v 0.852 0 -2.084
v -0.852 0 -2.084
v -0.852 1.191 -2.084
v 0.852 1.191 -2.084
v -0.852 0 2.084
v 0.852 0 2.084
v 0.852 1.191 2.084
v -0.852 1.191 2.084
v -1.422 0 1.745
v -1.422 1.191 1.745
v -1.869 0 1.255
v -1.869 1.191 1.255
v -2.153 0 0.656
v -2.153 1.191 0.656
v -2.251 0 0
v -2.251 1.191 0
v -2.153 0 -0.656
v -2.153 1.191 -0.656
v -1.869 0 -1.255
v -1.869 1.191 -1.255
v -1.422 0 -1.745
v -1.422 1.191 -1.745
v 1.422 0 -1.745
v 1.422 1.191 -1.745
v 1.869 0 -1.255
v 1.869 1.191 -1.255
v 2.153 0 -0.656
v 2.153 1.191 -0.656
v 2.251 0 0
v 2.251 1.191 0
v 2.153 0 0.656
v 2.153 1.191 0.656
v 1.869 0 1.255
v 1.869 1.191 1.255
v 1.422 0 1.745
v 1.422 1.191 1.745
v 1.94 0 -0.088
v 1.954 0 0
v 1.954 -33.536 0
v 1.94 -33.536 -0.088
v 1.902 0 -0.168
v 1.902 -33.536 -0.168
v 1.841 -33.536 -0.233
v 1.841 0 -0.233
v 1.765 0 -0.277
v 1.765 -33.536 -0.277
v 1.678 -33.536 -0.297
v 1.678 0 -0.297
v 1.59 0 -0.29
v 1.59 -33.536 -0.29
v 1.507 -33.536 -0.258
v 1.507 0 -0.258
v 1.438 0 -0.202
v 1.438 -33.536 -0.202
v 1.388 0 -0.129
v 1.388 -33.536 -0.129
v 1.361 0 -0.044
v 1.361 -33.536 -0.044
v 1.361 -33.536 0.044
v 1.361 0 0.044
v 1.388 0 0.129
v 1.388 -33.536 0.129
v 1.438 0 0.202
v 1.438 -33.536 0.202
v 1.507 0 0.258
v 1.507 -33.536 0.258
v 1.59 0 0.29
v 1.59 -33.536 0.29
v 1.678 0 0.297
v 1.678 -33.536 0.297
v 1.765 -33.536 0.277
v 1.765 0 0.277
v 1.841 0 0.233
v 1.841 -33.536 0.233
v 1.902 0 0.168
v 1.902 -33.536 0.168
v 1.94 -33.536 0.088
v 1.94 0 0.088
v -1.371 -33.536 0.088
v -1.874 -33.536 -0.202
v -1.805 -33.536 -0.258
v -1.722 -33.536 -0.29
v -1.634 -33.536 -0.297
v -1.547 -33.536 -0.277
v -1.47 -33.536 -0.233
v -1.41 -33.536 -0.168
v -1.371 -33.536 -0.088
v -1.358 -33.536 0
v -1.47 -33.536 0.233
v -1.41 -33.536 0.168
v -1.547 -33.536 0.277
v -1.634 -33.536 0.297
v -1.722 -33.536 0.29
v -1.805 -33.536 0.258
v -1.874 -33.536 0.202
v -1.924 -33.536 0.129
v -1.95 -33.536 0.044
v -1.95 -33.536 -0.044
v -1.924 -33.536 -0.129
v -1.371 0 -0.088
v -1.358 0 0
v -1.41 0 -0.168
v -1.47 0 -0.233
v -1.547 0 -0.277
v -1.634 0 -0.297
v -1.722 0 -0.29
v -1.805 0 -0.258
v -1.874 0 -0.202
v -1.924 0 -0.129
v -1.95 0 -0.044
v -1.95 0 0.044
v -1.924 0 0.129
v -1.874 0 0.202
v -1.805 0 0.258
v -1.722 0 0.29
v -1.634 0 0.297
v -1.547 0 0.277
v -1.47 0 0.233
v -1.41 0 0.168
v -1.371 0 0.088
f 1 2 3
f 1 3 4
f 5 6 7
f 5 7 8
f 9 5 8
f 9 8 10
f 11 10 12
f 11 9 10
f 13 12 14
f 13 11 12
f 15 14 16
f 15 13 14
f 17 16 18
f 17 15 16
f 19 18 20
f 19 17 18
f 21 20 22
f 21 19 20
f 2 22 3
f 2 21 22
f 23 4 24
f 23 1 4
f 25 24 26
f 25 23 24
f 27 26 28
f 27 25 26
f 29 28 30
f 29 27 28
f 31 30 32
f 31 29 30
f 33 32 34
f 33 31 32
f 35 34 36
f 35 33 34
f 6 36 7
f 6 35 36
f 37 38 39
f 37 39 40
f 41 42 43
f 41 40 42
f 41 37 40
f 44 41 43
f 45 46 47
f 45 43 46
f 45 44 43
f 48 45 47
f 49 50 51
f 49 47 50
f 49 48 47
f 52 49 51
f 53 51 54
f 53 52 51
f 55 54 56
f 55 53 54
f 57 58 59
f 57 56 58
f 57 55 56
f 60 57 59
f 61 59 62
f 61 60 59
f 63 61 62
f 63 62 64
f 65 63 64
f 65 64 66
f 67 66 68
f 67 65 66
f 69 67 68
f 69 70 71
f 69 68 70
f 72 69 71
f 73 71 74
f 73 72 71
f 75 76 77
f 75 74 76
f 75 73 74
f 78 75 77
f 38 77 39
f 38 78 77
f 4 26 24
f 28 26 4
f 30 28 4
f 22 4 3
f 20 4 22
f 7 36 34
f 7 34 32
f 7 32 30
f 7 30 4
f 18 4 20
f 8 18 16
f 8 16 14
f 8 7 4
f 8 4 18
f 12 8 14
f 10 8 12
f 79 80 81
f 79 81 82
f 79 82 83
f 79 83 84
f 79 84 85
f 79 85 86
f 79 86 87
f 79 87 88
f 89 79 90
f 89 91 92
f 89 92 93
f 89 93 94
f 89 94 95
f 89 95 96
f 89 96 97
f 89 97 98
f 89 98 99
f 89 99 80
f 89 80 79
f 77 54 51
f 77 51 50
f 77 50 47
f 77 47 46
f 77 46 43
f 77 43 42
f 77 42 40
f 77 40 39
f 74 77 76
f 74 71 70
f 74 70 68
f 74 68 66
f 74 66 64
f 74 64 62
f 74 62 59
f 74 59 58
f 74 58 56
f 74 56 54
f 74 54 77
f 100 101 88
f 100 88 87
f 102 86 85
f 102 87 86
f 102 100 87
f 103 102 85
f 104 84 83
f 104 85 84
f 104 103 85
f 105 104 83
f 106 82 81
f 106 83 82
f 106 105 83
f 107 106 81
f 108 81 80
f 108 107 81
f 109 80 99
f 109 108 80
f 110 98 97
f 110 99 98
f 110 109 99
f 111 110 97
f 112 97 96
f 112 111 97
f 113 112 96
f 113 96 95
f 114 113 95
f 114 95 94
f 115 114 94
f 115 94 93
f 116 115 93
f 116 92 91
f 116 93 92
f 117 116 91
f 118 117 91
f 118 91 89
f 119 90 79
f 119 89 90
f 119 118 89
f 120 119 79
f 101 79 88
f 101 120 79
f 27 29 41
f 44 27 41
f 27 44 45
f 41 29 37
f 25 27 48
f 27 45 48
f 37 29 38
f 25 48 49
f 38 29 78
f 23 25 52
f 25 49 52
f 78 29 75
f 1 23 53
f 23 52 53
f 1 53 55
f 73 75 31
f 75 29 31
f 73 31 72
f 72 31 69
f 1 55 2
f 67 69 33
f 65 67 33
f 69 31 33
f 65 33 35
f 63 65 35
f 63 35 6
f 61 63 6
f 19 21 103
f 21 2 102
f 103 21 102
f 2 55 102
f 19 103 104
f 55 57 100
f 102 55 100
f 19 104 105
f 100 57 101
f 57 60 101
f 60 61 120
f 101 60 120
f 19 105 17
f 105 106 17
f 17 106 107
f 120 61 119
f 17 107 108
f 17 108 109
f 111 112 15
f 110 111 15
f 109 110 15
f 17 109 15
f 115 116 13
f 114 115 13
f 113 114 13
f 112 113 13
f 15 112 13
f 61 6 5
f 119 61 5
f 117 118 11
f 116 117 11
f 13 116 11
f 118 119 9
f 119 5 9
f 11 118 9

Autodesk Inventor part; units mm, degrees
ref_plane "YZ Plane" through (0, 0, 0) normal (1, 0, 0) x (0, 1, 0)
ref_plane "XZ Plane" through (0, 0, 0) normal (0, 1, 0) x (-1, 0, 0)
ref_plane "XY Plane" through (0, 0, 0) normal (0, 0, 1) x (1, 0, 0)
sketch "Sketch2" plane through (0, 0, 0) normal (0, 1, 0) x (-1, 0, 0)
  line L0 (0.8521, -2.0836) -> (-0.8521, -2.0836)
  line L1 (-0.8521, 2.0836) -> (0.8521, 2.0836)
  arc A0 (0.8521, -2.0836) -> (0.8521, 2.0836) centre (0, 0) ccw
  arc A1 (-0.8521, 2.0836) -> (-0.8521, -2.0836) centre (0, 0) ccw
  point P0 (0, -2.0836)
extrude "Extrusion1" add sketch "Sketch2" along normal blind 1.1906
sketch "Sketch3" plane through (0, 0, 0) normal (0, -1, 0) x (1, 0, 0)
  circle A0 centre (-1.6558, 0) radius 0.2977
  circle A1 centre (1.6558, 0) radius 0.2977
  arc A2 (0.8521, -2.0836) -> (0.8521, 2.0836) centre (0, 0) ccw projected
  arc A3 (-0.8521, 2.0836) -> (-0.8521, -2.0836) centre (0, 0) ccw projected
  point P0 (2.2511, 0)
  point P1 (-2.2511, 0)
  dimension "d6" = 0.5953
  dimension "d7" = 0.5953
  dimension "d8" = 0.5953
  dimension "d9" = 0.5953
extrude "Extrusion2" add sketch "Sketch3" along normal blind 33.5359
properties part number "PhotoResistor"
